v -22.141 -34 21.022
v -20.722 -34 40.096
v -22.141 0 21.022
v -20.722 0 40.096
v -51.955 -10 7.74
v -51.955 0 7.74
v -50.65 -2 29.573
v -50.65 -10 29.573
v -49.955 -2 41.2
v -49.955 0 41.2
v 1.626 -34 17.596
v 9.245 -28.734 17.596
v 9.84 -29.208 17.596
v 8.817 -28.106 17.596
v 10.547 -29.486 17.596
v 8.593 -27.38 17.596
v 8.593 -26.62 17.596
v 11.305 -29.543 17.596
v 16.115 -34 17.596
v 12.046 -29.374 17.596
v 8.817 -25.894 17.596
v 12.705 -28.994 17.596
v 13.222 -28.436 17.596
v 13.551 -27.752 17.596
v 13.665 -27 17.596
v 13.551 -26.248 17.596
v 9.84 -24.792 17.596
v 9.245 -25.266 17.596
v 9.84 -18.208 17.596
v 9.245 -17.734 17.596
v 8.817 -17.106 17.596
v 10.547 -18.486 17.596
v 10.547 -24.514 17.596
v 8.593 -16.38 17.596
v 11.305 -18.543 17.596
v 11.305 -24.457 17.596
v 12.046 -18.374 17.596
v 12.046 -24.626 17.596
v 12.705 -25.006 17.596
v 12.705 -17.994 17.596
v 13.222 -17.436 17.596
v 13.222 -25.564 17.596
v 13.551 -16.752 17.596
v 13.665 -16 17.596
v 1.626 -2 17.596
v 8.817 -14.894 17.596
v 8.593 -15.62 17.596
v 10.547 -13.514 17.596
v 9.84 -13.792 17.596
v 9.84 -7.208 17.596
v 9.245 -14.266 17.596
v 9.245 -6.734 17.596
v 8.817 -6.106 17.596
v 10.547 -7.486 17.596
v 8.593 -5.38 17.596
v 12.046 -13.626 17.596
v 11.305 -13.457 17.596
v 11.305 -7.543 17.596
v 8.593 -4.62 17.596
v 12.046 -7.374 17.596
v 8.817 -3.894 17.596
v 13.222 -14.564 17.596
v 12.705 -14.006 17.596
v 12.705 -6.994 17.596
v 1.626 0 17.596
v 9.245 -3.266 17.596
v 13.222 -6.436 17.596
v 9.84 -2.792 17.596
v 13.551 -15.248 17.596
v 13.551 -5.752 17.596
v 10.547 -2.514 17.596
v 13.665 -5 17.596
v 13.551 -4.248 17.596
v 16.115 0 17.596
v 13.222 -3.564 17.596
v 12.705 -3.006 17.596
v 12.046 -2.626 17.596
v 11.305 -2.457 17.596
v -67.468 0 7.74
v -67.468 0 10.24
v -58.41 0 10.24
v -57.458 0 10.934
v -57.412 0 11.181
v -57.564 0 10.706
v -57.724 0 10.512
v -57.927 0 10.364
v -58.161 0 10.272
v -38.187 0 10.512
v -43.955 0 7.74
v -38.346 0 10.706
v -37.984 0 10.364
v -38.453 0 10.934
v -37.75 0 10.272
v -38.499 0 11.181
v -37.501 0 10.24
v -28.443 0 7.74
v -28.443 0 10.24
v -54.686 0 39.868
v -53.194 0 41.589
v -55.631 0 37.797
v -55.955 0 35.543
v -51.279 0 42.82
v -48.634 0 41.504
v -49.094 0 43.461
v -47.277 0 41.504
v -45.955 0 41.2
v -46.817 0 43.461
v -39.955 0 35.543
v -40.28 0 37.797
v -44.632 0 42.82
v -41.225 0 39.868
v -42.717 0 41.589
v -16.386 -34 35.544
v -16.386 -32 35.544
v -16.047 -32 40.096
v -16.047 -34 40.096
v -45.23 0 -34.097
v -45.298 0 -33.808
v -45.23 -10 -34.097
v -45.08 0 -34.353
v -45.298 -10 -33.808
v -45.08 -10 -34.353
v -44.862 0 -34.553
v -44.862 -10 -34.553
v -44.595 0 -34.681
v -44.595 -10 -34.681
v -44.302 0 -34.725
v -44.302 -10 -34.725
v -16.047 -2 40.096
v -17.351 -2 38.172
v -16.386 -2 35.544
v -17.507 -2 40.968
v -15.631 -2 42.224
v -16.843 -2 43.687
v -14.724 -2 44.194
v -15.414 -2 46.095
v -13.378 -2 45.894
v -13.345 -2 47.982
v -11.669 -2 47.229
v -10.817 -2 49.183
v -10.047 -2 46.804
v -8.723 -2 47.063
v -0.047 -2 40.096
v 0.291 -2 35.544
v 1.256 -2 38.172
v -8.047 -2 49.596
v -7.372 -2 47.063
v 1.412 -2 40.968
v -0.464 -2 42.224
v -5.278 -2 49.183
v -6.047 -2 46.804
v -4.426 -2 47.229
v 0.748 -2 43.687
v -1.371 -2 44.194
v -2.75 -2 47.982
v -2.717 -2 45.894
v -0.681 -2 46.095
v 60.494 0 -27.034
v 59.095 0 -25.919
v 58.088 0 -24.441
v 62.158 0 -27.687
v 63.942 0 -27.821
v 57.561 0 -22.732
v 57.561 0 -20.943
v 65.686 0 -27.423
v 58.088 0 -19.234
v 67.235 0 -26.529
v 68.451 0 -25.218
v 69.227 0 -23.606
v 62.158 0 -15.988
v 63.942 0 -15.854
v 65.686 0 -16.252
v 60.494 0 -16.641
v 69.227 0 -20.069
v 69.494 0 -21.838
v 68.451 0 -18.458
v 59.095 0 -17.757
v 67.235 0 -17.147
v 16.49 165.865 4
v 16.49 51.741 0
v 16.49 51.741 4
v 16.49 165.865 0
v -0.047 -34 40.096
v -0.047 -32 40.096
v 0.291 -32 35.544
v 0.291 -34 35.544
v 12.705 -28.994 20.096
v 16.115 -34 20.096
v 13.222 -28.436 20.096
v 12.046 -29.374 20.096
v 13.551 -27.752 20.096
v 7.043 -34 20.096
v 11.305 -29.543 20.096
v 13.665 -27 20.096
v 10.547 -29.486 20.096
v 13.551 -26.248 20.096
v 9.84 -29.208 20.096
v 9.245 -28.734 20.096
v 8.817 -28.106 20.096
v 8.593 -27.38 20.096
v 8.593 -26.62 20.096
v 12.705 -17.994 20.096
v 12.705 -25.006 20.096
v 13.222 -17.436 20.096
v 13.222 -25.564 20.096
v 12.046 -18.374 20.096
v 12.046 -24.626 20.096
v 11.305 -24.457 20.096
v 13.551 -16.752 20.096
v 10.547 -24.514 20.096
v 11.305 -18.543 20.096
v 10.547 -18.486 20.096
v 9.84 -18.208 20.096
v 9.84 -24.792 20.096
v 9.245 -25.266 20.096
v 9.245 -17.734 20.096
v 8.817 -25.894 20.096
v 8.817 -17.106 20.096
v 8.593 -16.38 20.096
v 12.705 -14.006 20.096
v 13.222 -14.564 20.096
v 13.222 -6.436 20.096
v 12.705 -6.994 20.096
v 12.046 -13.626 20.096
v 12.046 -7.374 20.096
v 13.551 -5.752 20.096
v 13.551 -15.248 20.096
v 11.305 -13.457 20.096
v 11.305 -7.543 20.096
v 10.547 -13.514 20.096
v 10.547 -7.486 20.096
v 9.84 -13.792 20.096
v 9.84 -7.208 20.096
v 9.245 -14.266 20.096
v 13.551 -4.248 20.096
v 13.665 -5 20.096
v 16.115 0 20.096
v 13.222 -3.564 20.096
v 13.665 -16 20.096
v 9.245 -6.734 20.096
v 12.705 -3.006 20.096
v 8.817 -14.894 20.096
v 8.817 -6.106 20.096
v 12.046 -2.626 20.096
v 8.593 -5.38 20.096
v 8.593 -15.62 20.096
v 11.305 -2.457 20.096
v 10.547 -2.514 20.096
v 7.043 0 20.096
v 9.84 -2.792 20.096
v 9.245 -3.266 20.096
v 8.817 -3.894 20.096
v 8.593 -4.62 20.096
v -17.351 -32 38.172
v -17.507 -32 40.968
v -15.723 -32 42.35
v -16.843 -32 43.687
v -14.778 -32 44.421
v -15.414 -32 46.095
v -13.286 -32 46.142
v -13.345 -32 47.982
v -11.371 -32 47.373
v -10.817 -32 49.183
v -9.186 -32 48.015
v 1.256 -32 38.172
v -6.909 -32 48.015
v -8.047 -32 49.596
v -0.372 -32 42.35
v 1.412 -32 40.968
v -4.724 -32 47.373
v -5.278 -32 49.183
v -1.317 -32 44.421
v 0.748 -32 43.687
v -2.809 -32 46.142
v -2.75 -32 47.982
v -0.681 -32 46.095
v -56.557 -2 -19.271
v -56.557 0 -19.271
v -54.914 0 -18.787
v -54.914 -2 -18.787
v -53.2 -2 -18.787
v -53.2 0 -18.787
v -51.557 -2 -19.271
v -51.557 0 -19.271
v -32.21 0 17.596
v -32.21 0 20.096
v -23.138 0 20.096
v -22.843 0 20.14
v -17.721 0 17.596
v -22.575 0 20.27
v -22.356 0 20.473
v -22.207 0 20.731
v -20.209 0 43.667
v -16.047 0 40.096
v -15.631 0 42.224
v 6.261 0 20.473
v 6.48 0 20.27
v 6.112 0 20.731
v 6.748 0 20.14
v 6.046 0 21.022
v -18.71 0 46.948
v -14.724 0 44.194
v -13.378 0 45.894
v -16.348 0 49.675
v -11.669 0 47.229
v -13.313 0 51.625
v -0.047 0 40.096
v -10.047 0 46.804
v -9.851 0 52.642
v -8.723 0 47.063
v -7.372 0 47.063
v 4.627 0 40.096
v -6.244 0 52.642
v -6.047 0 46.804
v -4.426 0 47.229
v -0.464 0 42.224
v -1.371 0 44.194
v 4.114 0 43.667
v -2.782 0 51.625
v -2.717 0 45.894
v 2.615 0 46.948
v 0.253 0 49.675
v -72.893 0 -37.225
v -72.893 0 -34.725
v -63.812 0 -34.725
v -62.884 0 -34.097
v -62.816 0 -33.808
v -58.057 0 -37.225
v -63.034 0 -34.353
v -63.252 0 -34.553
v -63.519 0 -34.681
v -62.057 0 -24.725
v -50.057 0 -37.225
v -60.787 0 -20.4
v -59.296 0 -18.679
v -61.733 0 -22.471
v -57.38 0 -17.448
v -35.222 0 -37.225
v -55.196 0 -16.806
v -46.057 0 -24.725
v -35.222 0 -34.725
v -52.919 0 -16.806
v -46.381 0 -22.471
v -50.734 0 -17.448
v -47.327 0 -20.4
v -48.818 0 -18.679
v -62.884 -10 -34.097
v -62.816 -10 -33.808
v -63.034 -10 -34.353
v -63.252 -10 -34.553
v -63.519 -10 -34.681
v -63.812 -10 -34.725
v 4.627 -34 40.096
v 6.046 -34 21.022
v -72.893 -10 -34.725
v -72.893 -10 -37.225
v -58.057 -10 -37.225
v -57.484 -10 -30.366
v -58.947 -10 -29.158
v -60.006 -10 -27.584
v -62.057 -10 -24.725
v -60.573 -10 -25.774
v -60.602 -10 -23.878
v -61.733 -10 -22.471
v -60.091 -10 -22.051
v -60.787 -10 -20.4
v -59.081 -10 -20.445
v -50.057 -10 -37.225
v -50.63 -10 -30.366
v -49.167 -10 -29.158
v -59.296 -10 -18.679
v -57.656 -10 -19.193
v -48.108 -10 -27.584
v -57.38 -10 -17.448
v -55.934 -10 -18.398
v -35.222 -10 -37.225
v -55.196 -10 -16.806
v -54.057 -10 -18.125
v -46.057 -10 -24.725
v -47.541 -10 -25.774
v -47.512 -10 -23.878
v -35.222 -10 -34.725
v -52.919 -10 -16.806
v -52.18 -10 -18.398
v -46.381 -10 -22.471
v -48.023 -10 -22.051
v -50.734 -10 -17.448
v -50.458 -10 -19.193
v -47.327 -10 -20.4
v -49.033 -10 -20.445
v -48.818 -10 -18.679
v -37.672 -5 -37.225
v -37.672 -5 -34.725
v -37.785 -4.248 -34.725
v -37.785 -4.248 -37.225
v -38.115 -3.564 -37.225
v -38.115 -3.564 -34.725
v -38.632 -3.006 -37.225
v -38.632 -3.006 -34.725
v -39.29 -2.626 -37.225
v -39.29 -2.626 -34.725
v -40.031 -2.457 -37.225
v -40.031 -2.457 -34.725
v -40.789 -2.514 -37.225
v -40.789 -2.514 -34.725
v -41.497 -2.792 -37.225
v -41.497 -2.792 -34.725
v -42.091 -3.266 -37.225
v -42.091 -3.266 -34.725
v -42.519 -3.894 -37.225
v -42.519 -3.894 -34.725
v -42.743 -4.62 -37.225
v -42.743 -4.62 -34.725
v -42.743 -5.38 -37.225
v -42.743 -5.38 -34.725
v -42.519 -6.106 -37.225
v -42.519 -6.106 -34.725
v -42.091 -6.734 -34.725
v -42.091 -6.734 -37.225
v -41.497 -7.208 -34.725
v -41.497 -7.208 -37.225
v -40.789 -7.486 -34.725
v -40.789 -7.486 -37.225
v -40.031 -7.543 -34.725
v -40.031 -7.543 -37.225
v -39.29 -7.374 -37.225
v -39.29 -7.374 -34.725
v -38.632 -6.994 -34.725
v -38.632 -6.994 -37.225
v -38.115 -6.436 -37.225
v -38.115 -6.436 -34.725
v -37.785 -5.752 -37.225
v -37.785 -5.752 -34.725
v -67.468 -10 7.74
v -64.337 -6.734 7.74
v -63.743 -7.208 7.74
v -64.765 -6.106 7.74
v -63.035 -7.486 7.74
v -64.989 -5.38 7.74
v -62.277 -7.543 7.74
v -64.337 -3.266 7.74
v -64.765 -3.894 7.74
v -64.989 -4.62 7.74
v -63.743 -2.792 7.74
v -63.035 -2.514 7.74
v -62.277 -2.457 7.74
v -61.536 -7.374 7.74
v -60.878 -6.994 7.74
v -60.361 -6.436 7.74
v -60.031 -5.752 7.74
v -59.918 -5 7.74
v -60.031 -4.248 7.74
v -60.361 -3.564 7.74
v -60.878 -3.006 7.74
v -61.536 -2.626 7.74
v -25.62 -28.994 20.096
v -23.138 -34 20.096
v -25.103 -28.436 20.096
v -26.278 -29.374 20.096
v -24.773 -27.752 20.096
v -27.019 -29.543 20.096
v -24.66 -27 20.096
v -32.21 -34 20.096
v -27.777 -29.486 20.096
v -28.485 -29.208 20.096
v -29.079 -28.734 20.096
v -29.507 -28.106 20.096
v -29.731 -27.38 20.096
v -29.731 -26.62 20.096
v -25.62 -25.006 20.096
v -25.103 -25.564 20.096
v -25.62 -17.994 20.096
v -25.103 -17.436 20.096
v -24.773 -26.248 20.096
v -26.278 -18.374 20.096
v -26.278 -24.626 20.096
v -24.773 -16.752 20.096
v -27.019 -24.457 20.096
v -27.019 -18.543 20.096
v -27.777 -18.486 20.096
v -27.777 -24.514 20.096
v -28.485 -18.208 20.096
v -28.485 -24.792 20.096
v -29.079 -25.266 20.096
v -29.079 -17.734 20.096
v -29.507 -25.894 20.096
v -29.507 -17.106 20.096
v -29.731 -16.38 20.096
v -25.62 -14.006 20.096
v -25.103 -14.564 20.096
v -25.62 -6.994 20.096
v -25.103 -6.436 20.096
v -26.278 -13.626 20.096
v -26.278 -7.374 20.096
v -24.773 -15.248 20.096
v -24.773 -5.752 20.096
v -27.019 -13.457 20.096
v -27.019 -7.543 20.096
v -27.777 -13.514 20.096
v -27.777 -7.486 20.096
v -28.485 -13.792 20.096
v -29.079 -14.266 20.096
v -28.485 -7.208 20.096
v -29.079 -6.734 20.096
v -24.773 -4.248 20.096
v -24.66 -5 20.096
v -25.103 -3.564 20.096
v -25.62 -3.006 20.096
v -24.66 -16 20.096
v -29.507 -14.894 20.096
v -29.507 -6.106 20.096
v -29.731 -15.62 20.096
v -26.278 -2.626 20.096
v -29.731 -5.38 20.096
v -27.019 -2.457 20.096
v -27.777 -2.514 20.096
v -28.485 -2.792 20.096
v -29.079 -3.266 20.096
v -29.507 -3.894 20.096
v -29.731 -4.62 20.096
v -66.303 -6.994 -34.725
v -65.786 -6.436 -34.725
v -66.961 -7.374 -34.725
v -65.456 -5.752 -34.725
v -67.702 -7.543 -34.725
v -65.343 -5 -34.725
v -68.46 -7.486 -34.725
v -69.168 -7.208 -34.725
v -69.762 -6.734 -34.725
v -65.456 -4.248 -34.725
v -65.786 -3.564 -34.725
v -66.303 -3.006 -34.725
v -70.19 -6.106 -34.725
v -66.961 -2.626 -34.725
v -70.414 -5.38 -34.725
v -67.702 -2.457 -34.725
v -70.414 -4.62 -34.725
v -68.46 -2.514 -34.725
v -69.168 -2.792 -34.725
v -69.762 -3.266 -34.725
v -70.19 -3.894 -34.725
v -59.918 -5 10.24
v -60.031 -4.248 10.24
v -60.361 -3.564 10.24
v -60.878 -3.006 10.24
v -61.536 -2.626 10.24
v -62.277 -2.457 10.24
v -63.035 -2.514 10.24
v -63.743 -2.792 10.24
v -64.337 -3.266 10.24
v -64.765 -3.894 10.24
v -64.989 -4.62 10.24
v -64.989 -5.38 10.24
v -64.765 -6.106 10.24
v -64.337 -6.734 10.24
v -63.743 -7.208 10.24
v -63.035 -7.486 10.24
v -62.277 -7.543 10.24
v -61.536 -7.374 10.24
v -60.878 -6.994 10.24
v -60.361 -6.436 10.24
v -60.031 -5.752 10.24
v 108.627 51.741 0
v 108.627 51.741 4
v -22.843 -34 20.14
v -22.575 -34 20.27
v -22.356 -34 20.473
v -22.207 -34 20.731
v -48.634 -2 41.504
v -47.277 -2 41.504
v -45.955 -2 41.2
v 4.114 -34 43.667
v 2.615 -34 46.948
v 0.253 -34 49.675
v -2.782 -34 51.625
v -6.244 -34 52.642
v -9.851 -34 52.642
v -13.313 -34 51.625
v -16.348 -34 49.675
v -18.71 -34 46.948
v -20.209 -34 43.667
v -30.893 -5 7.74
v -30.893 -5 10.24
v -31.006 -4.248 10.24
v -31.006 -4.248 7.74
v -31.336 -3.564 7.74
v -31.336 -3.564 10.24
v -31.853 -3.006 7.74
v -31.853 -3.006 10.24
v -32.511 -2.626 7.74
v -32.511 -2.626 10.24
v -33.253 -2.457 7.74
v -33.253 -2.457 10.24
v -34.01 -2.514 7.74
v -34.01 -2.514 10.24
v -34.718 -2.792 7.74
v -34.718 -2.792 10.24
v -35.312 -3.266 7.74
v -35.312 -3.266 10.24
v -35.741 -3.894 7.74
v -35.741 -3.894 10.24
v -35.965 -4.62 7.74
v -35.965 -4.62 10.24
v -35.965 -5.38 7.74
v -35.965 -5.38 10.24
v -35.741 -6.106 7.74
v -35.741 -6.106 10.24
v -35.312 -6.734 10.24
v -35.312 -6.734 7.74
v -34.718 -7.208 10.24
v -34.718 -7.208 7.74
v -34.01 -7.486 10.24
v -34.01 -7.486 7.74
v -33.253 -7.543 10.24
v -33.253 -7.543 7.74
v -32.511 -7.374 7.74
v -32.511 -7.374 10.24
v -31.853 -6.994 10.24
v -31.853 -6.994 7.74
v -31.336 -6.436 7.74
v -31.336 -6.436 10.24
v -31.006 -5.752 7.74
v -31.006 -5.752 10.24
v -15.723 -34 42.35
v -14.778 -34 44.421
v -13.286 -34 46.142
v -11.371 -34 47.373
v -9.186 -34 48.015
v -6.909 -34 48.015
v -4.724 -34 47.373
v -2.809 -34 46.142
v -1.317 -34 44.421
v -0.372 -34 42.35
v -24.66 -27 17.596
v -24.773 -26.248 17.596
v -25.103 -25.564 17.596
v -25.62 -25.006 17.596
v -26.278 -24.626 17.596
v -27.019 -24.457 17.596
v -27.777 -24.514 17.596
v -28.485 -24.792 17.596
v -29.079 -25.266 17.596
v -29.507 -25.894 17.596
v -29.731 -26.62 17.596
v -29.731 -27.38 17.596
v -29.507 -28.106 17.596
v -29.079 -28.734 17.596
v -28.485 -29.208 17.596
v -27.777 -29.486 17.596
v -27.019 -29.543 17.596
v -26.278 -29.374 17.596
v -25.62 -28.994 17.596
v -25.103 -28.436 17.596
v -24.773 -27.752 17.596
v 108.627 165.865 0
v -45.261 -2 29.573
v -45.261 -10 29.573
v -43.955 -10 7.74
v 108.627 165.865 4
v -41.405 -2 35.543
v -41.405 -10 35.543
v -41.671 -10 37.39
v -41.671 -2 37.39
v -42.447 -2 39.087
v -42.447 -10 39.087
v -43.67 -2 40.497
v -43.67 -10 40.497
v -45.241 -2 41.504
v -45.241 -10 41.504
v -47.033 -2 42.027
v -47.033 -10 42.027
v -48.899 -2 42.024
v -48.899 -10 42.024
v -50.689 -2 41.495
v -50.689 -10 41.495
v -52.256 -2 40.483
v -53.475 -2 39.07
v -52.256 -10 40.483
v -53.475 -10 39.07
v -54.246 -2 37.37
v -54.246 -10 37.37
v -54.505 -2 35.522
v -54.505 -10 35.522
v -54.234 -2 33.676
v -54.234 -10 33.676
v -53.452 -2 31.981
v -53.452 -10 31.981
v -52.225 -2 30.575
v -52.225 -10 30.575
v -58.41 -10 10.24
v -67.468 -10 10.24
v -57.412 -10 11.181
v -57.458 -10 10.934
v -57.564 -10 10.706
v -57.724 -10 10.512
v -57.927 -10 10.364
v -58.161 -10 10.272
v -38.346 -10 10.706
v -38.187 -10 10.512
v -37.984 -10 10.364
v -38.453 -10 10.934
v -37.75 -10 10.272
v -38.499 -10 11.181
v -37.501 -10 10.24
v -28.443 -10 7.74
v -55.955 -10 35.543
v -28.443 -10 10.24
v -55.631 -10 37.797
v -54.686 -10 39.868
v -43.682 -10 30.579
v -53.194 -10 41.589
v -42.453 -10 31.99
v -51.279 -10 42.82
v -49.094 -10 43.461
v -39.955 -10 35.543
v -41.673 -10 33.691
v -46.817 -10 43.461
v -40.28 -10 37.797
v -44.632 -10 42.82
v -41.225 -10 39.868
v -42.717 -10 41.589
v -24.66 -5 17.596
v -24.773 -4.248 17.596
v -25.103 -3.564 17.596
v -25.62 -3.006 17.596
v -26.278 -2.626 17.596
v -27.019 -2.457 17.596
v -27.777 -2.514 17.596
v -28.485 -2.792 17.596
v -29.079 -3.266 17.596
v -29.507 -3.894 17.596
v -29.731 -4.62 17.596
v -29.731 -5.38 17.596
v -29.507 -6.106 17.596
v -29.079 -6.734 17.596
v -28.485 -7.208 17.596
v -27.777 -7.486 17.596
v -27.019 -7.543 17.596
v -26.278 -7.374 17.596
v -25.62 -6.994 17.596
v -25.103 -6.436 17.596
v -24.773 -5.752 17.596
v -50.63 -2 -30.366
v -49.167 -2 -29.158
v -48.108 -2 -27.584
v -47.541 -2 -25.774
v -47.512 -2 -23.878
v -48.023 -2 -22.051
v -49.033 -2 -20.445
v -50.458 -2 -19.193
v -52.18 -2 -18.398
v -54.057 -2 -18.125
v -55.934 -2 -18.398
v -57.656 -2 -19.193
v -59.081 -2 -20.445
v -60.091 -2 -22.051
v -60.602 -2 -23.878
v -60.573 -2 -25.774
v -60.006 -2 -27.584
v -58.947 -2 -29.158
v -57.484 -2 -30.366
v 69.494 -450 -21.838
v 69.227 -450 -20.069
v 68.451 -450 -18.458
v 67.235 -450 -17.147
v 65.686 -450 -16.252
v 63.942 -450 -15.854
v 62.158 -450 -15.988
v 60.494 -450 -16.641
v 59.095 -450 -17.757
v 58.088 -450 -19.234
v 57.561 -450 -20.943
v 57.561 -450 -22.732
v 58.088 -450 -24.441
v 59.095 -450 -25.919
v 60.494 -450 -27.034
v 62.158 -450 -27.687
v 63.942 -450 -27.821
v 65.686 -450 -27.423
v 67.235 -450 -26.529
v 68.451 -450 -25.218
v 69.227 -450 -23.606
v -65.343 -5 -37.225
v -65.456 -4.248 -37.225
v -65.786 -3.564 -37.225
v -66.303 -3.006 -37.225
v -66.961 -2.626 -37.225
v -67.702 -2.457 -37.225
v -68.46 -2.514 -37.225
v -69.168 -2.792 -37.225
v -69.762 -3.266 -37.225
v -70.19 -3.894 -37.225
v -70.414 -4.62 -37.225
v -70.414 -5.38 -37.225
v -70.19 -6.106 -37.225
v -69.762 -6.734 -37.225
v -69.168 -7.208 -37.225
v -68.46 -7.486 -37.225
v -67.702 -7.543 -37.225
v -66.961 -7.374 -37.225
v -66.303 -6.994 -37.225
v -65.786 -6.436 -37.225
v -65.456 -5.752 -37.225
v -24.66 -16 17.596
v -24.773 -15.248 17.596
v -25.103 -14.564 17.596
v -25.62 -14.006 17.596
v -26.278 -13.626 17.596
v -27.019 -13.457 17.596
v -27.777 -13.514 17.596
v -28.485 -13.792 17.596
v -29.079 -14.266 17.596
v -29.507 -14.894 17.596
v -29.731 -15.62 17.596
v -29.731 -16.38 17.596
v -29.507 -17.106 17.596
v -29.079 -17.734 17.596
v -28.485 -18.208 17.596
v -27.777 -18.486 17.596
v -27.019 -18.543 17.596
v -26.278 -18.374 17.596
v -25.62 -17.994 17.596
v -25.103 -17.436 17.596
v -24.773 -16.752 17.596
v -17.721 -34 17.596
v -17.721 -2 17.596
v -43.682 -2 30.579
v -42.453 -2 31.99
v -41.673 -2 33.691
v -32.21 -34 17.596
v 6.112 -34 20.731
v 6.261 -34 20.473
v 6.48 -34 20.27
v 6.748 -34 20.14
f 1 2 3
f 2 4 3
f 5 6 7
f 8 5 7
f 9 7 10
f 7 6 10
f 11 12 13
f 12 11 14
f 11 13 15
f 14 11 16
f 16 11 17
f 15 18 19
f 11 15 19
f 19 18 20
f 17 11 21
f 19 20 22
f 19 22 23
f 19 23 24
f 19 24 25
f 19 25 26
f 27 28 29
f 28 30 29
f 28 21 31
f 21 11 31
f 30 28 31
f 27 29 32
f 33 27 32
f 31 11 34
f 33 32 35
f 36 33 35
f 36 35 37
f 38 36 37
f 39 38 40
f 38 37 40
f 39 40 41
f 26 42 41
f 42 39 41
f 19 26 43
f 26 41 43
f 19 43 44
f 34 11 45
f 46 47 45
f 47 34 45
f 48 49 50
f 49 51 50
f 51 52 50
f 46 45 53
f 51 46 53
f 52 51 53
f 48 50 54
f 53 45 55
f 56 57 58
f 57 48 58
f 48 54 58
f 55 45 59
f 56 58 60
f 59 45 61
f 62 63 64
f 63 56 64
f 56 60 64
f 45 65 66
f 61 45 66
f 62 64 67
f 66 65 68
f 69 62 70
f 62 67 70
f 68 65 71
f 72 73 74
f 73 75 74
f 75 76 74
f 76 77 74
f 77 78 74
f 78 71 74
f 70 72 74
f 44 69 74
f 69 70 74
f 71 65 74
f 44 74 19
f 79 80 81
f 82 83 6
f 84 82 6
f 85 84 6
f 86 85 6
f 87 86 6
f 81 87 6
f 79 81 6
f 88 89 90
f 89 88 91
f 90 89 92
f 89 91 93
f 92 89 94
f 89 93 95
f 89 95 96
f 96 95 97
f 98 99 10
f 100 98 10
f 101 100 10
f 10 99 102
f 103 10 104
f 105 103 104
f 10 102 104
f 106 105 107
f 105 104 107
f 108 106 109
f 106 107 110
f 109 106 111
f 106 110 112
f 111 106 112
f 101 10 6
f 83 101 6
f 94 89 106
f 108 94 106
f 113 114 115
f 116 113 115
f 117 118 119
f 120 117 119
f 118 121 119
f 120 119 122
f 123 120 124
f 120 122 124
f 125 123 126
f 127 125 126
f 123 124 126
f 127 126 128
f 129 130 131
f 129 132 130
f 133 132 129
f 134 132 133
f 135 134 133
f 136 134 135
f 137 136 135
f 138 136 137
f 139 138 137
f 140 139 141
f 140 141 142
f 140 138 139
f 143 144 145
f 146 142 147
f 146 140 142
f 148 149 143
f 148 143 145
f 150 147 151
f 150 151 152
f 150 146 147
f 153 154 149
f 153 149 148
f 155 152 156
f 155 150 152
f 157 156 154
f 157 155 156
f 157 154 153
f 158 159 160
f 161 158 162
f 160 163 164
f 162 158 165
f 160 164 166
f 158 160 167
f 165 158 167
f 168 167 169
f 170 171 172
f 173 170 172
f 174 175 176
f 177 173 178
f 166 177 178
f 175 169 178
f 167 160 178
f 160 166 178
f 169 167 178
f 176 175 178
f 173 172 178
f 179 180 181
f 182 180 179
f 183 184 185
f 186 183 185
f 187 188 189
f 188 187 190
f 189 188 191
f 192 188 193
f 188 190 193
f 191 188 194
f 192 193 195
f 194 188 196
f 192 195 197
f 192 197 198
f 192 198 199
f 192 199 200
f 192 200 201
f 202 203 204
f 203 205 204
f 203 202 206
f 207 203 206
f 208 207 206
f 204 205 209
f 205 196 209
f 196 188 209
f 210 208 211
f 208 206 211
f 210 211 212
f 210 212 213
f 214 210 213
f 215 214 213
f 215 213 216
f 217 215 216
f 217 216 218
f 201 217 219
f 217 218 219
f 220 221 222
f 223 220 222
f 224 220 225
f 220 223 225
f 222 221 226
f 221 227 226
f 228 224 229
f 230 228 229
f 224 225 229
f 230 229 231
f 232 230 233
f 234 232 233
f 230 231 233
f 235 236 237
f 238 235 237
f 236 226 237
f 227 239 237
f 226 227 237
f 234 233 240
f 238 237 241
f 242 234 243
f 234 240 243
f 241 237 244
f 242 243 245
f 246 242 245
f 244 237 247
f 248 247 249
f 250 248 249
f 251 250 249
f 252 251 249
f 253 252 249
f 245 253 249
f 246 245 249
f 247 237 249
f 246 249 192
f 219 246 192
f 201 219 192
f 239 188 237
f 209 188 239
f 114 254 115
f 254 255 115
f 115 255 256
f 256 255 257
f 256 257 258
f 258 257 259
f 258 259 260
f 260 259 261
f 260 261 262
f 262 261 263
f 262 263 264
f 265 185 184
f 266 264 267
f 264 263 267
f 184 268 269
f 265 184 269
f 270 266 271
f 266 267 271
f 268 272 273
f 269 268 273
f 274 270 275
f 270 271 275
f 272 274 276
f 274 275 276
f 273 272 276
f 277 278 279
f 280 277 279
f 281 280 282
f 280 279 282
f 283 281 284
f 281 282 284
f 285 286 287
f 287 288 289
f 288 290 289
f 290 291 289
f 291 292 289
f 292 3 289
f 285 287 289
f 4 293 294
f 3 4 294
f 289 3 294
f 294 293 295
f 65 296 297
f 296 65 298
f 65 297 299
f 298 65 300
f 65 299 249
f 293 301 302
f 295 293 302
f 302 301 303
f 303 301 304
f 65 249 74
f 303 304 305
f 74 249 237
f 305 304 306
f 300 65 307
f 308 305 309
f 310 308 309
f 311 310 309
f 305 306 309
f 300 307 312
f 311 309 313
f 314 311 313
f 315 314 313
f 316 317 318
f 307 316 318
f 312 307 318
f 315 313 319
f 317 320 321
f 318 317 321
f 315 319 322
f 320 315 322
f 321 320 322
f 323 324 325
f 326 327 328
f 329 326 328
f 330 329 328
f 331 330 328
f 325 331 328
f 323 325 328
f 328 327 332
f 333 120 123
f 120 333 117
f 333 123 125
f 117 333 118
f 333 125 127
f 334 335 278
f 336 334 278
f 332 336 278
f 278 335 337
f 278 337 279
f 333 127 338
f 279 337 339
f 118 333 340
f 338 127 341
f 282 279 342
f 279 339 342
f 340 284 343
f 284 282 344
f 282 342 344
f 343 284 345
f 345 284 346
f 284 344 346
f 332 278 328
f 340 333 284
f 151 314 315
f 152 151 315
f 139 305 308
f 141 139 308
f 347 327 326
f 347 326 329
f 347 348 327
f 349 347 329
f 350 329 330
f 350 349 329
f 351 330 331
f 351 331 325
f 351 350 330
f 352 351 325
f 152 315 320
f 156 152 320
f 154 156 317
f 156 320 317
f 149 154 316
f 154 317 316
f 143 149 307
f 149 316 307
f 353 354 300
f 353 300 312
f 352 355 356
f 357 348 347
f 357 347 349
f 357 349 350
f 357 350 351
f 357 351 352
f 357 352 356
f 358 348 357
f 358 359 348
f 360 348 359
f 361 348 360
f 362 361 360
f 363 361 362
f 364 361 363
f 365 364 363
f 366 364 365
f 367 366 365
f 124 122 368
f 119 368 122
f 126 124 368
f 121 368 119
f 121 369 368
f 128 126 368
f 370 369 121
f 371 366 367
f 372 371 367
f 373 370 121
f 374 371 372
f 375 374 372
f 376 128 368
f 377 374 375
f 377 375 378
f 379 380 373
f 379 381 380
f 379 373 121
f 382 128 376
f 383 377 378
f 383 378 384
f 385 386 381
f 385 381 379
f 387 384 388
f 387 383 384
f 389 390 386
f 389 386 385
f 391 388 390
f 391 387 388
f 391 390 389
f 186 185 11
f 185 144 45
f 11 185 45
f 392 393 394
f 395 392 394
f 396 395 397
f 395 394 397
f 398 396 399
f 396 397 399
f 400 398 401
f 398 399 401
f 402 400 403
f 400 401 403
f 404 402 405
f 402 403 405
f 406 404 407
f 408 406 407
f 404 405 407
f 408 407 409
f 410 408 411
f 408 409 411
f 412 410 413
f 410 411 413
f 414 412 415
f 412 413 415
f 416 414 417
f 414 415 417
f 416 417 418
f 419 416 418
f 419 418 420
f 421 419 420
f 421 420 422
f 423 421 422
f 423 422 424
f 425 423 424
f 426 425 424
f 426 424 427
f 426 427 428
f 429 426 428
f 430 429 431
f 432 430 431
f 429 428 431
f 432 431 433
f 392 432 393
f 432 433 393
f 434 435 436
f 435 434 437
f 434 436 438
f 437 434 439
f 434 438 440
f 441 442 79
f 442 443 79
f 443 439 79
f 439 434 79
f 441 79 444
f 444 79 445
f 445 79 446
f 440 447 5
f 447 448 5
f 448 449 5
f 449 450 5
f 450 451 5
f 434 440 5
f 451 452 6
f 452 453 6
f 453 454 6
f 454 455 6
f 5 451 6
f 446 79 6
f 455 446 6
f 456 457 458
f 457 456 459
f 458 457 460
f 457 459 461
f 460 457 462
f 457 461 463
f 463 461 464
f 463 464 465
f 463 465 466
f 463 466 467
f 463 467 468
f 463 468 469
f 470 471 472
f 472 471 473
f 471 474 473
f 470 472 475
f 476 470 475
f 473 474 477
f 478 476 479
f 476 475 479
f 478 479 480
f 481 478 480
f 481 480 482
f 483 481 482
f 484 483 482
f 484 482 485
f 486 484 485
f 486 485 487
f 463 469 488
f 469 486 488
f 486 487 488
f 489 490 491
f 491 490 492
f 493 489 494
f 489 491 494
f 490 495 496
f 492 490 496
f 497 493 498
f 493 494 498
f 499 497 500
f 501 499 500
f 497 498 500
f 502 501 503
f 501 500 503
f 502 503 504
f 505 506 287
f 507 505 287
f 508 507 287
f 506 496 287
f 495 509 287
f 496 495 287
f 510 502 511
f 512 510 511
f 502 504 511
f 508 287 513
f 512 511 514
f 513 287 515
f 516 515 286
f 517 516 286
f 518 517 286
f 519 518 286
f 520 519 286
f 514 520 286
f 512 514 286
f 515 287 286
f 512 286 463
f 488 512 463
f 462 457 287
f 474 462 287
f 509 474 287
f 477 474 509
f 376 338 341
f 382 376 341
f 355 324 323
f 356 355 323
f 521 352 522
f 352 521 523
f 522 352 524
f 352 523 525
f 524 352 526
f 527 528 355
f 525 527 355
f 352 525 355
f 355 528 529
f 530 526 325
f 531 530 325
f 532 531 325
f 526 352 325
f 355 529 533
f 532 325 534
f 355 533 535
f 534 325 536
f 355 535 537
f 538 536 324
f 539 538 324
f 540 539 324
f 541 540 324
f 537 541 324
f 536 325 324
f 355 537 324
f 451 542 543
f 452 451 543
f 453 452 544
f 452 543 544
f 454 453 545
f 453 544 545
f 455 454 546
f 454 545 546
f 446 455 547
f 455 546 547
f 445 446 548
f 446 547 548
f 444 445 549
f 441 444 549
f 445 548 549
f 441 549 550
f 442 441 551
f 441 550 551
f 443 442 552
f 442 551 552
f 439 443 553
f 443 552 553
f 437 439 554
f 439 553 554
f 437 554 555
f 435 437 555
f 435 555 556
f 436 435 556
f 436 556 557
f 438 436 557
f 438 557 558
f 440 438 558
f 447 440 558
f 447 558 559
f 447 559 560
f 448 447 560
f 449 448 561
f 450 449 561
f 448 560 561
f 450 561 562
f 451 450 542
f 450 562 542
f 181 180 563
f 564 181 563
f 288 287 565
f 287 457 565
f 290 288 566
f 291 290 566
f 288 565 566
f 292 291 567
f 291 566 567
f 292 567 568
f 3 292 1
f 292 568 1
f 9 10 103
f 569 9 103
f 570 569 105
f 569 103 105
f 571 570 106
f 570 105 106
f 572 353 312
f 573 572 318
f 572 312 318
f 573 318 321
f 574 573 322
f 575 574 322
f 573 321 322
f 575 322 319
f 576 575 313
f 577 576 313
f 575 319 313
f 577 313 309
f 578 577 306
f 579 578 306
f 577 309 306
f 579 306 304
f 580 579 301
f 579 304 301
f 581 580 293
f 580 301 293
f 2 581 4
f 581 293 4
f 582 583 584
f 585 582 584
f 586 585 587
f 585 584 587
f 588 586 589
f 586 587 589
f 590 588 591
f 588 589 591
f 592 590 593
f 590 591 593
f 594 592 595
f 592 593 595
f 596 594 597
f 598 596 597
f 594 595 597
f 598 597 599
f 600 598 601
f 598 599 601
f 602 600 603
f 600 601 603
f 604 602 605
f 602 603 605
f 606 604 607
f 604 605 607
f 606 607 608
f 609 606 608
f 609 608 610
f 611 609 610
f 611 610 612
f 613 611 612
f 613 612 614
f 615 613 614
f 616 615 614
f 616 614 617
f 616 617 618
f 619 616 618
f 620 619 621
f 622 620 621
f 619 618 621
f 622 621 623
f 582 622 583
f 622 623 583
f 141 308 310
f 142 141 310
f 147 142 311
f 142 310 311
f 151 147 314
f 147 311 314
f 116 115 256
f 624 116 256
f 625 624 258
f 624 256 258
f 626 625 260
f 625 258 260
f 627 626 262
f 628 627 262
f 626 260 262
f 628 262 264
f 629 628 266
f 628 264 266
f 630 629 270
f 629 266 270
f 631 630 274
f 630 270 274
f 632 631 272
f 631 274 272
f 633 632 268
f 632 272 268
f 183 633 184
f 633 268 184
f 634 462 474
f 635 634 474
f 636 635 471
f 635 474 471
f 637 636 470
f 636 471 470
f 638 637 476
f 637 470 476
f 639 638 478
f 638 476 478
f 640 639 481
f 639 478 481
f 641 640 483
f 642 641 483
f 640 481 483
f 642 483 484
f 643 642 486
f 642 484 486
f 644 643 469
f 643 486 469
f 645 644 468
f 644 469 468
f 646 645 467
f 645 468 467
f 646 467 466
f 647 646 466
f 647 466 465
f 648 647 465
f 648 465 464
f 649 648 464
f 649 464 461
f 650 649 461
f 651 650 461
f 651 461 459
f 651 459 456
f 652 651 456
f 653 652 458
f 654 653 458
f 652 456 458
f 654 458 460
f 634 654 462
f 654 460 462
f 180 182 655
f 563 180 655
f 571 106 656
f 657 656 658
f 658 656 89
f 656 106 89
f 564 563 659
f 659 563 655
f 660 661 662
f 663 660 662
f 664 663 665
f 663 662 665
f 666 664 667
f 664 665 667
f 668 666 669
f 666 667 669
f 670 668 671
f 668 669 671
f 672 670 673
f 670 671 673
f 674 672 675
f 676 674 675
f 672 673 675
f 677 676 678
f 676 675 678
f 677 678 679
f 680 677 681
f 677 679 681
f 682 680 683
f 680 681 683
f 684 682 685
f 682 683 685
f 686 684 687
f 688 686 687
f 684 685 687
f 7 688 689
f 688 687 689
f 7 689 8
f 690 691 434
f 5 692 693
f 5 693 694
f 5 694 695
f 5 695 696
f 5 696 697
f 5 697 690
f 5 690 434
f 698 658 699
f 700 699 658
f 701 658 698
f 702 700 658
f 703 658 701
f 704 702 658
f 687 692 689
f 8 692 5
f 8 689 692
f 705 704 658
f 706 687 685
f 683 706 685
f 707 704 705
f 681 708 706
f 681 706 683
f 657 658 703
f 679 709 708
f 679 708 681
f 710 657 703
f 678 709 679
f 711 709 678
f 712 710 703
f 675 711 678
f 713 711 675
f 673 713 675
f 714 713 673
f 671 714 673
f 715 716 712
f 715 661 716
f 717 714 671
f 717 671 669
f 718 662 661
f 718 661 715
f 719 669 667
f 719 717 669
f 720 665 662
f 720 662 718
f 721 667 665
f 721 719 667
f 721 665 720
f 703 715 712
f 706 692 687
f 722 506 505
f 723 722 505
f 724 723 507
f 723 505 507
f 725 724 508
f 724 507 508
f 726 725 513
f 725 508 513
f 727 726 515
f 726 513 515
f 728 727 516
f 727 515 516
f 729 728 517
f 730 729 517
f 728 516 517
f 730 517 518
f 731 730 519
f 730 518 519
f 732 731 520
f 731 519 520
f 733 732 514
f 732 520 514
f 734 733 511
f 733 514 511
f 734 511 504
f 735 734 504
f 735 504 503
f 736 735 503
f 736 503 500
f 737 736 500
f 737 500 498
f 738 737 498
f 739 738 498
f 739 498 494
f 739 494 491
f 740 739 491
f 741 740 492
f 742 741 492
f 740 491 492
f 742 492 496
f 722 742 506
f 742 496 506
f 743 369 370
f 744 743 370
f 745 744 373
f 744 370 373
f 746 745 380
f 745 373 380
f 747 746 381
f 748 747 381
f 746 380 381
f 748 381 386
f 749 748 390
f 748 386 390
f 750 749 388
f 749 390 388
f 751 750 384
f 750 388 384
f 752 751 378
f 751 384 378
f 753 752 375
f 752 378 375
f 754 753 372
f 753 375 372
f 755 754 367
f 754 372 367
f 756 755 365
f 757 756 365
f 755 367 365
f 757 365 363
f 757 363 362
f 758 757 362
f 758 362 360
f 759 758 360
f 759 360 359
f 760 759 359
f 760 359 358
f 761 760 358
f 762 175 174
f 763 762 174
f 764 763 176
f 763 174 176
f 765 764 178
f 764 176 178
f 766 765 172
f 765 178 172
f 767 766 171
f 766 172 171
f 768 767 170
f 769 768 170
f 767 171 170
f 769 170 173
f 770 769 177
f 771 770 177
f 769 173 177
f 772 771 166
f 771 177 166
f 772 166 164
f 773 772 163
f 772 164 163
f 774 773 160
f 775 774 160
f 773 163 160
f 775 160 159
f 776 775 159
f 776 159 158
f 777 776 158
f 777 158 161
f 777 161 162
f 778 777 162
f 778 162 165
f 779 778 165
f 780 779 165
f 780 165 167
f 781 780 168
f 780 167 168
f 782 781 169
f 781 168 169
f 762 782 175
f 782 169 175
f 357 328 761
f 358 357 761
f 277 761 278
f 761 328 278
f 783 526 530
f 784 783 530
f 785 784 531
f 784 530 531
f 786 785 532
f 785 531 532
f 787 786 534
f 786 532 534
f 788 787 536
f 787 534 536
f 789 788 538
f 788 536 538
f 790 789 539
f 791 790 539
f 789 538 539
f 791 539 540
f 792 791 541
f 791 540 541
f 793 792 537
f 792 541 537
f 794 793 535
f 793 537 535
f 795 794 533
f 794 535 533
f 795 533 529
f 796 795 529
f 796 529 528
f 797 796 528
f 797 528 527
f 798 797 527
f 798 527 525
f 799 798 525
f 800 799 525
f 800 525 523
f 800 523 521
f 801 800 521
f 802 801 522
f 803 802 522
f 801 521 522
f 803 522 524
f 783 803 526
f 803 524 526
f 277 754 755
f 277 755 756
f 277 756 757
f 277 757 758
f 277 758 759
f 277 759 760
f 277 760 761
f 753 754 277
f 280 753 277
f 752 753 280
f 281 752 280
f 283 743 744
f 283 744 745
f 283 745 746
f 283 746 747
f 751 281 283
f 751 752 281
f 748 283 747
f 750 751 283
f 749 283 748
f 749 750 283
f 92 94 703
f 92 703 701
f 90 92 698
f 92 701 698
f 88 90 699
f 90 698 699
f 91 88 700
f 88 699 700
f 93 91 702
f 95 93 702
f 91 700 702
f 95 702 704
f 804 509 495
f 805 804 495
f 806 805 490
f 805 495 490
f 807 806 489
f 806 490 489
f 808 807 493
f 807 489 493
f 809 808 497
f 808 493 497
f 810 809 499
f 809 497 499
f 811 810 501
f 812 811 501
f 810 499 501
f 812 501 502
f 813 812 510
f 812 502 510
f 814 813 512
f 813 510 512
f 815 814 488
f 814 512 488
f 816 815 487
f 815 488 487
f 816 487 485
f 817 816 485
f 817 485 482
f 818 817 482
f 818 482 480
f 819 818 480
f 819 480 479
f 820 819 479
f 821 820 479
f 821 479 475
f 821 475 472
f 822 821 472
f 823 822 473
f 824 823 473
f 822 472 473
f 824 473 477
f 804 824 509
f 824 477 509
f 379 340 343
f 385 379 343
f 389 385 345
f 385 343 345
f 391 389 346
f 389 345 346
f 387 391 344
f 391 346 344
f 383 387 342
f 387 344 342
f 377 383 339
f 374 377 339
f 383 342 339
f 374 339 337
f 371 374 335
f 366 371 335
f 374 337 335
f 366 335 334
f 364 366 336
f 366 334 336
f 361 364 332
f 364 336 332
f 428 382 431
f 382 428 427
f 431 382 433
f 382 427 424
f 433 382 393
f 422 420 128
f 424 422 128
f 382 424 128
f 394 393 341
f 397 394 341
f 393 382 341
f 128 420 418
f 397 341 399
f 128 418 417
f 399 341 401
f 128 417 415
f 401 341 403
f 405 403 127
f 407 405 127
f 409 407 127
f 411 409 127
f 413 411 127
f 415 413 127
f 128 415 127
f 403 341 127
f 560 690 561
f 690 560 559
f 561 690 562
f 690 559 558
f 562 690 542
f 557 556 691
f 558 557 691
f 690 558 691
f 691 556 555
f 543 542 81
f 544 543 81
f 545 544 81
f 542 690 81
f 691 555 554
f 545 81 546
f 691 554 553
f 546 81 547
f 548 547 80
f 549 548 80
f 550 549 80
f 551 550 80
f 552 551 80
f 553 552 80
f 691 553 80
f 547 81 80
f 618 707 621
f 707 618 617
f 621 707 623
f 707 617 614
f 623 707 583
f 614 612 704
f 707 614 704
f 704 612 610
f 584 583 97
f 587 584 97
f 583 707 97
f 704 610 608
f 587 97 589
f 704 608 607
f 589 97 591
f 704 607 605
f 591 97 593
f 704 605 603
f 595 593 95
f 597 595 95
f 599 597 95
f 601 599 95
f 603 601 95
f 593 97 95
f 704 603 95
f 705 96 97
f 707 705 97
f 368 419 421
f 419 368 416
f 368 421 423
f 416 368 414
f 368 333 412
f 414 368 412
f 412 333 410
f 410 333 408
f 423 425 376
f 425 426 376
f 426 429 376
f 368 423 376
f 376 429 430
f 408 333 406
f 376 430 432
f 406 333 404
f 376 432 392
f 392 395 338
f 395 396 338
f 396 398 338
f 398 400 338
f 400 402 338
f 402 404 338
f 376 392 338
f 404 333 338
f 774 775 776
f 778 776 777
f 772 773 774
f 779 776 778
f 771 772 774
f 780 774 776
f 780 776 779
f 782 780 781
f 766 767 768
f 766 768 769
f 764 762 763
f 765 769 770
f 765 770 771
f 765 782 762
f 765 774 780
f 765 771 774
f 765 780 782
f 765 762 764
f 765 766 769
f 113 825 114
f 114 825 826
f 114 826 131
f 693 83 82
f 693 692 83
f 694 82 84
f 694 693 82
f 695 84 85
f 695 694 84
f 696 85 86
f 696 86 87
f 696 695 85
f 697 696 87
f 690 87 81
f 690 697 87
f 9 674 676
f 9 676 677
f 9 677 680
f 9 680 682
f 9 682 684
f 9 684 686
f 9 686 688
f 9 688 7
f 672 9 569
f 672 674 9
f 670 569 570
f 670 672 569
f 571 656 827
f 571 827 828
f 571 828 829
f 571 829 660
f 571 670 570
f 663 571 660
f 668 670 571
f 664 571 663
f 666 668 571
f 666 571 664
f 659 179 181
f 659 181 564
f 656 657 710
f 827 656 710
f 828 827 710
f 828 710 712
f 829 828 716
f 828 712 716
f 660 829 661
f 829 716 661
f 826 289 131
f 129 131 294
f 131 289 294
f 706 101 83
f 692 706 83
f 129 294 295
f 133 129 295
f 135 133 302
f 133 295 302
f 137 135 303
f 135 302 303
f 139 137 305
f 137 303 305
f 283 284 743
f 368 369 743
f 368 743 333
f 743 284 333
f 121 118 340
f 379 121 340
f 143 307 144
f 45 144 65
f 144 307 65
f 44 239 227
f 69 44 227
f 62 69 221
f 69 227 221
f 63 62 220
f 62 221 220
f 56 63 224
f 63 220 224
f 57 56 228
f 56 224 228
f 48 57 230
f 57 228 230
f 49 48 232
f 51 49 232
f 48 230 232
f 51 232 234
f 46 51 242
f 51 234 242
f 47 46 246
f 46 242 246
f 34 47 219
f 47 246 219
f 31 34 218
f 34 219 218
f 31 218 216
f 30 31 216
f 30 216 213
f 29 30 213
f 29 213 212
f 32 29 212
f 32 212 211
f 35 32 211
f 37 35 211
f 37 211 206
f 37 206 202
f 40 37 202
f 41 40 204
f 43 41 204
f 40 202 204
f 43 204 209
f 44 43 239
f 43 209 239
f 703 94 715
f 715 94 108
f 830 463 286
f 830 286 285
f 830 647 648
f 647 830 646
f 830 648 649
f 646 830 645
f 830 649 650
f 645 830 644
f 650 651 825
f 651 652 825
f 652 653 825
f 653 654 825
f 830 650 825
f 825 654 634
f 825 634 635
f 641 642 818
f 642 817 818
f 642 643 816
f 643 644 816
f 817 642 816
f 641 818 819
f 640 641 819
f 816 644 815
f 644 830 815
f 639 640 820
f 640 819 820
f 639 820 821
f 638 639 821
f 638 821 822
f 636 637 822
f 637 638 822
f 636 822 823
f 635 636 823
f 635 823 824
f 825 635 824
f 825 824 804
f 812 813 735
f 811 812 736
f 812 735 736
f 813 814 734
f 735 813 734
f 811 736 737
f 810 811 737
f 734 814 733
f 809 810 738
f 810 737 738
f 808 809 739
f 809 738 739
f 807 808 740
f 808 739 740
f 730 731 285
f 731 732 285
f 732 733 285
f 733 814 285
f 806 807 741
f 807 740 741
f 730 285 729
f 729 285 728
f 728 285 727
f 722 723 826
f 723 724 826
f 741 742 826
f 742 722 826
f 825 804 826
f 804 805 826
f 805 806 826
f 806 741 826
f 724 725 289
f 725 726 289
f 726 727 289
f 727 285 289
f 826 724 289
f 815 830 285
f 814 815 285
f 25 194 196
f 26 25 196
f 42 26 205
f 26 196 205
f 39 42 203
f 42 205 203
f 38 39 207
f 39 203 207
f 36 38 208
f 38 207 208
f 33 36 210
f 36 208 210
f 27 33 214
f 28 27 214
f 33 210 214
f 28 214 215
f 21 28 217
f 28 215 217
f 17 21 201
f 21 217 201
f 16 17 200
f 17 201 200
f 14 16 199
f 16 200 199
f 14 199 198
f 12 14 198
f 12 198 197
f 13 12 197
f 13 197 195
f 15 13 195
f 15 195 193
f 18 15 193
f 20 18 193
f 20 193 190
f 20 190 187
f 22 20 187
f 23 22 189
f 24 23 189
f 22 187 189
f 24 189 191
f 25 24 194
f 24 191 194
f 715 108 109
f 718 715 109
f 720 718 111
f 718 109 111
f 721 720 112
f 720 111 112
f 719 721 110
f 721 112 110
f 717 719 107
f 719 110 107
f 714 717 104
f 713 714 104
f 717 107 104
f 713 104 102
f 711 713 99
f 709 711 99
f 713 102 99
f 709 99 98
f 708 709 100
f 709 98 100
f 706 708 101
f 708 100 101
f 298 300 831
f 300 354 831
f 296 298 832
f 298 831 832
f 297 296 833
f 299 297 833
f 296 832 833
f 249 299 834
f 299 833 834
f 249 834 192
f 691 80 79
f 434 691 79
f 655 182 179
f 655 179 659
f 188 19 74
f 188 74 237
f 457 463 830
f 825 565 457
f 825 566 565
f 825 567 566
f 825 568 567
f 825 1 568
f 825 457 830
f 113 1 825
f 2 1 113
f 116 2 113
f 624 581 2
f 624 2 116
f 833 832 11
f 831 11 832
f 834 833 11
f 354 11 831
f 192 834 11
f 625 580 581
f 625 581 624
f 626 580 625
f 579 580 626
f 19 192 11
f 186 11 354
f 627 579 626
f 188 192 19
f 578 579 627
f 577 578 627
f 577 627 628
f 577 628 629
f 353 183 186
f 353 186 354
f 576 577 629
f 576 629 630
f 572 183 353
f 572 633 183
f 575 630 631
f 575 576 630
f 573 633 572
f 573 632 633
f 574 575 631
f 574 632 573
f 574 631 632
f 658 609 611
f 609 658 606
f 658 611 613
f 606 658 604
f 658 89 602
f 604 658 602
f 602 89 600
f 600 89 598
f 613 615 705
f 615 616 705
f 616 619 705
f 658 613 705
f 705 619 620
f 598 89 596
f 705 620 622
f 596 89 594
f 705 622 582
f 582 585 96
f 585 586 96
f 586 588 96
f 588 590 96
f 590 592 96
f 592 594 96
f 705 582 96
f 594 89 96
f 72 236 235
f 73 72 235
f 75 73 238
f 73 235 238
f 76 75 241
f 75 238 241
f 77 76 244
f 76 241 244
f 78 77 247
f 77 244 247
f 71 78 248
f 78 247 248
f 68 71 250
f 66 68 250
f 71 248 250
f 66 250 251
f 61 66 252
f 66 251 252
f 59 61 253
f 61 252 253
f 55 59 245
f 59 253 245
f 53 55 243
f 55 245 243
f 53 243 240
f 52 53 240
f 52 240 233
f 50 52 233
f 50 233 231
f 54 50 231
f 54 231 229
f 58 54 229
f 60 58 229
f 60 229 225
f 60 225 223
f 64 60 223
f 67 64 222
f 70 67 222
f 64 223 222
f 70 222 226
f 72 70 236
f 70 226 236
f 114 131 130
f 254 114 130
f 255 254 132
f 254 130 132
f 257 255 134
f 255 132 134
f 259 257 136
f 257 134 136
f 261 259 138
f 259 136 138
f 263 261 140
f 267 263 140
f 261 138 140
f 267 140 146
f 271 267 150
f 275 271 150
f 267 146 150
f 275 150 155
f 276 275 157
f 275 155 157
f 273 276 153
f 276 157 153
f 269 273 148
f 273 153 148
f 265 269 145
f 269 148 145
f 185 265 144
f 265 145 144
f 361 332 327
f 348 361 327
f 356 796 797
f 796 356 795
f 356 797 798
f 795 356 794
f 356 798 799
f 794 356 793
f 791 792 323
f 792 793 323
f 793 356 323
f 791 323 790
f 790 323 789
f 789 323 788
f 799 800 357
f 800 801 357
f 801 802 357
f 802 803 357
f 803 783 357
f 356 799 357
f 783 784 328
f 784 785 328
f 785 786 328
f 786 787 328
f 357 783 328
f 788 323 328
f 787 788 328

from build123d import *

# Parameters (mm, degrees)
F5_DEPTH  = 2
F7_DEPTH  = 10
F9_DEPTH  = 8
F10_DEPTH = 30
F11_R     = 2.55
F13_DEPTH = 2.5
F12_R     = 2.55
F14_DEPTH = 2.5
F15_R     = 2.55
F16_R     = 2.55
F17_DEPTH = 2.5
F19_DEPTH = 2
F20_R     = 1
F20_2_R   = 1
F22_DEPTH = 10
F24_R     = 2.55
F25_R     = 2.55
F26_DEPTH = 2.5
F27_R     = 1
F28_DEPTH = 8
F29_R     = 6
F30_DEPTH = 450
F31_W     = 92.136753723
F31_H     = 114.1239255667
F32_DEPTH = 4


with BuildPart() as f5:
    # F4 (on Front) → F5 (new body)
    with BuildSketch(Plane.XZ):
        with BuildLine():
            Line((6.114652846, 20.0959499925), (4.6272888825, 40.0959499925))
            ThreePointArc((4.6272888825, 40.0959499925), (-8.0474885181, 52.7707273931), (-20.7222659187, 40.0959499925))
            Line((-20.7222659187, 40.0959499925), (-22.2096298821, 20.0959499925))
            Line((-22.2096298821, 20.0959499925), (-32.2096298821, 20.0959499925))
            Line((-32.2096298821, 20.0959499925), (-32.2096298821, 17.5959499925))
            Line((-32.2096298821, 17.5959499925), (-17.720772977, 17.5959499925))
            Line((-17.720772977, 17.5959499925), (-16.0474885181, 40.0959499925))
            ThreePointArc((-16.0474885181, 40.0959499925), (-14.7241353227, 44.1939030544), (-11.6693254615, 47.2291328133))
            Line((-11.6693254615, 47.2291328133), (-10.0474885181, 46.804153925))
            ThreePointArc((-10.0474885181, 46.804153925), (-8.0474885181, 47.0959499925), (-6.0474885181, 46.804153925))
            Line((-6.0474885181, 46.804153925), (-4.4256515746, 47.2291328133))
            ThreePointArc((-4.4256515746, 47.2291328133), (-1.3708417134, 44.1939030544), (-0.0474885181, 40.0959499925))
            Line((-0.0474885181, 40.0959499925), (1.6257959408, 17.5959499925))
            Line((1.6257959408, 17.5959499925), (16.114652846, 17.5959499925))
            Line((16.114652846, 17.5959499925), (16.114652846, 20.0959499925))
            Line((16.114652846, 20.0959499925), (6.114652846, 20.0959499925))
        make_face()
    extrude(amount=F5_DEPTH)

    # F6 (on face) → F10 (join)
    with BuildSketch(Plane.XZ.offset(2)):
        with BuildLine():
            ThreePointArc((-16.3860004266, 35.544113094), (-8.0474885181, 49.5959499925), (0.2910233905, 35.544113094))
            Line((0.2910233905, 35.544113094), (1.6257959408, 17.5959499925))
            Line((1.6257959408, 17.5959499925), (16.114652846, 17.5959499925))
            Line((16.114652846, 17.5959499925), (16.114652846, 20.0959499925))
            Line((16.114652846, 20.0959499925), (6.114652846, 20.0959499925))
            Line((6.114652846, 20.0959499925), (4.6272888825, 40.0959499925))
            ThreePointArc((4.6272888825, 40.0959499925), (-8.0474885181, 52.7707273931), (-20.7222659187, 40.0959499925))
            Line((-20.7222659187, 40.0959499925), (-22.2096298821, 20.0959499925))
            Line((-22.2096298821, 20.0959499925), (-32.2096298821, 20.0959499925))
            Line((-32.2096298821, 20.0959499925), (-32.2096298821, 17.5959499925))
            Line((-32.2096298821, 17.5959499925), (-17.720772977, 17.5959499925))
            Line((-17.720772977, 17.5959499925), (-16.3860004266, 35.544113094))
        make_face()
    extrude(amount=F10_DEPTH)

    # F15 (on face) + F16 (on face) → F17 (cut, through all)
    with BuildSketch(Plane.XY.offset(20.0959499925)):
        with Locations((-27.2096298821, -5)):
            Circle(F15_R)
        with Locations((-27.2096298821, -16)):
            Circle(F15_R)
        with Locations((-27.2096298821, -27)):
            Circle(F15_R)
    with BuildSketch(Plane.XY.offset(20.0959499925)):
        with Locations((11.114652846, -27)):
            Circle(F16_R)
        with Locations((11.114652846, -16)):
            Circle(F16_R)
        with Locations((11.114652846, -5)):
            Circle(F16_R)
    extrude(amount=-F17_DEPTH, mode=Mode.SUBTRACT)

    # F18 (on face) → F19 (join)
    with BuildSketch(Plane.XZ.offset(32)):
        with BuildLine():
            ThreePointArc((-16.0474885181, 40.0959499925), (-8.0474885181, 48.0959499925), (-0.0474885181, 40.0959499925))
            Line((-0.0474885181, 40.0959499925), (0.2910233905, 35.544113094))
            ThreePointArc((0.2910233905, 35.544113094), (-8.0474885181, 49.5959499925), (-16.3860004266, 35.544113094))
            Line((-16.3860004266, 35.544113094), (-16.0474885181, 40.0959499925))
        make_face()
        with BuildLine():
            ThreePointArc((-16.3860004266, 35.544113094), (-8.0474885181, 49.5959499925), (0.2910233905, 35.544113094))
            Line((0.2910233905, 35.544113094), (1.6257959408, 17.5959499925))
            Line((1.6257959408, 17.5959499925), (16.114652846, 17.5959499925))
            Line((16.114652846, 17.5959499925), (16.114652846, 20.0959499925))
            Line((16.114652846, 20.0959499925), (6.114652846, 20.0959499925))
            Line((6.114652846, 20.0959499925), (4.6272888825, 40.0959499925))
            ThreePointArc((4.6272888825, 40.0959499925), (-8.0474885181, 52.7707273931), (-20.7222659187, 40.0959499925))
            Line((-20.7222659187, 40.0959499925), (-22.2096298821, 20.0959499925))
            Line((-22.2096298821, 20.0959499925), (-32.2096298821, 20.0959499925))
            Line((-32.2096298821, 20.0959499925), (-32.2096298821, 17.5959499925))
            Line((-32.2096298821, 17.5959499925), (-17.720772977, 17.5959499925))
            Line((-17.720772977, 17.5959499925), (-16.3860004266, 35.544113094))
        make_face()
    extrude(amount=F19_DEPTH)

    # F20
    f20_edges = [f5.edges().sort_by_distance(p)[0] for p in [
        (6.114653, -17, 20.09595),
        (-22.20963, -17, 20.09595),
    ]]
    fillet(f20_edges, radius=F20_R)


with BuildPart() as f7:
    # F3 (on Front) → F7 (new body)
    with BuildSketch(Plane.XZ):
        with BuildLine():
            Line((-38.4430666815, 10.2402567863), (-39.9554989645, 35.5427722446))
            ThreePointArc((-39.9554989645, 35.5427722446), (-47.9554989645, 43.5427722446), (-55.9554989645, 35.5427722446))
            Line((-55.9554989645, 35.5427722446), (-57.4679312476, 10.2402567863))
            Line((-57.4679312476, 10.2402567863), (-67.4679312476, 10.2402567863))
            Line((-67.4679312476, 10.2402567863), (-67.4679312476, 7.7402567863))
            Line((-67.4679312476, 7.7402567863), (-51.9554989645, 7.7402567863))
            Line((-51.9554989645, 7.7402567863), (-49.9554989645, 41.1996264941))
            ThreePointArc((-49.9554989645, 41.1996264941), (-47.9554989645, 41.5427722446), (-45.9554989645, 41.1996264941))
            Line((-45.9554989645, 41.1996264941), (-43.9554989645, 7.7402567863))
            Line((-43.9554989645, 7.7402567863), (-28.4430666815, 7.7402567863))
            Line((-28.4430666815, 7.7402567863), (-28.4430666815, 10.2402567863))
            Line((-28.4430666815, 10.2402567863), (-38.4430666815, 10.2402567863))
        make_face()
    extrude(amount=F7_DEPTH)

    # F8 (on face) → F9 (cut)
    with BuildSketch(Plane.XZ.offset(10)):
        with BuildLine():
            ThreePointArc((-45.2605220173, 29.5728811858), (-42.4530177513, 31.9895764299), (-41.4054989645, 35.5427722446))
            ThreePointArc((-41.4054989645, 35.5427722446), (-51.5086947793, 41.0452534578), (-50.6504759118, 29.5728811858))
            Line((-50.6504759118, 29.5728811858), (-49.9554989645, 41.1996264941))
            ThreePointArc((-49.9554989645, 41.1996264941), (-47.9554989645, 41.5427722446), (-45.9554989645, 41.1996264941))
            Line((-45.9554989645, 41.1996264941), (-45.2605220173, 29.5728811858))
        make_face()
    extrude(amount=-F9_DEPTH, mode=Mode.SUBTRACT)

    # F11 (on face) → F13 (cut, through all)
    with BuildSketch(Plane.XY.offset(10.2402567863)):
        with Locations((-62.4679312476, -5)):
            Circle(F11_R)
    extrude(amount=-F13_DEPTH, mode=Mode.SUBTRACT)

    # F12 (on face) → F14 (cut, through all)
    with BuildSketch(Plane.XY.offset(10.2402567863)):
        with Locations((-33.4430666815, -5)):
            Circle(F12_R)
    extrude(amount=-F14_DEPTH, mode=Mode.SUBTRACT)

    # F20#2
    f20_2_edges = [f7.edges().sort_by_distance(p)[0] for p in [
        (-38.443067, -5, 10.240257),
        (-57.467931, -5, 10.240257),
    ]]
    fillet(f20_2_edges, radius=F20_2_R)


with BuildPart() as f22:
    # F21 (on Front) → F22 (new body)
    with BuildSketch(Plane.XZ):
        with BuildLine():
            Line((-45.2216026043, -34.7250620283), (-46.0570544552, -24.7250620283))
            ThreePointArc((-46.0570544552, -24.7250620283), (-54.0570544552, -16.7250620283), (-62.0570544552, -24.7250620283))
            Line((-62.0570544552, -24.7250620283), (-62.8925063061, -34.7250620283))
            Line((-62.8925063061, -34.7250620283), (-72.8925063061, -34.7250620283))
            Line((-72.8925063061, -34.7250620283), (-72.8925063061, -37.2250620283))
            Line((-72.8925063061, -37.2250620283), (-58.0570544552, -37.2250620283))
            Line((-58.0570544552, -37.2250620283), (-56.5570544552, -19.270705971))
            ThreePointArc((-56.5570544552, -19.270705971), (-54.0570544552, -18.7250620283), (-51.5570544552, -19.270705971))
            Line((-51.5570544552, -19.270705971), (-50.0570544552, -37.2250620283))
            Line((-50.0570544552, -37.2250620283), (-35.2216026043, -37.2250620283))
            Line((-35.2216026043, -37.2250620283), (-35.2216026043, -34.7250620283))
            Line((-35.2216026043, -34.7250620283), (-45.2216026043, -34.7250620283))
        make_face()
    extrude(amount=F22_DEPTH)

    # F24 (on face) + F25 (on face) → F26 (cut, through all)
    with BuildSketch(Plane.XY.offset(-34.7250620283)):
        with Locations((-67.8925063061, -5)):
            Circle(F24_R)
    with BuildSketch(Plane.XY.offset(-34.7250620283)):
        with Locations((-40.2216026043, -5)):
            Circle(F25_R)
    extrude(amount=-F26_DEPTH, mode=Mode.SUBTRACT)

    # F27
    f27_edges = [f22.edges().sort_by_distance(p)[0] for p in [
        (-62.892506, -5, -34.725062),
        (-45.221603, -5, -34.725062),
    ]]
    fillet(f27_edges, radius=F27_R)

    # F23 (on face) → F28 (cut)
    with BuildSketch(Plane.XZ.offset(10)):
        with BuildLine():
            ThreePointArc((-50.6301258389, -30.3656435816), (-48.3047623526, -27.9609754336), (-47.4570544552, -24.7250620283))
            ThreePointArc((-47.4570544552, -24.7250620283), (-57.2929678604, -18.9727699257), (-57.4839830714, -30.3656435816))
            Line((-57.4839830714, -30.3656435816), (-56.5570544552, -19.270705971))
            ThreePointArc((-56.5570544552, -19.270705971), (-54.0570544552, -18.7250620283), (-51.5570544552, -19.270705971))
            Line((-51.5570544552, -19.270705971), (-50.6301258389, -30.3656435816))
        make_face()
    extrude(amount=-F28_DEPTH, mode=Mode.SUBTRACT)


with BuildPart() as f30:
    # F29 (on Front) → F30 (new body)
    with BuildSketch(Plane.XZ):
        with Locations((63.4935870767, -21.8376088887)):
            Circle(F29_R)
    extrude(amount=F30_DEPTH)


with BuildPart() as f32:
    # F31 (on Top) → F32 (new body)
    with BuildSketch(Plane.XY):
        with Locations((62.5587562099, 108.8034138083)):
            Rectangle(F31_W, F31_H)
    extrude(amount=F32_DEPTH)


solid = Compound([f5.part, f7.part, f22.part, f30.part, f32.part])
